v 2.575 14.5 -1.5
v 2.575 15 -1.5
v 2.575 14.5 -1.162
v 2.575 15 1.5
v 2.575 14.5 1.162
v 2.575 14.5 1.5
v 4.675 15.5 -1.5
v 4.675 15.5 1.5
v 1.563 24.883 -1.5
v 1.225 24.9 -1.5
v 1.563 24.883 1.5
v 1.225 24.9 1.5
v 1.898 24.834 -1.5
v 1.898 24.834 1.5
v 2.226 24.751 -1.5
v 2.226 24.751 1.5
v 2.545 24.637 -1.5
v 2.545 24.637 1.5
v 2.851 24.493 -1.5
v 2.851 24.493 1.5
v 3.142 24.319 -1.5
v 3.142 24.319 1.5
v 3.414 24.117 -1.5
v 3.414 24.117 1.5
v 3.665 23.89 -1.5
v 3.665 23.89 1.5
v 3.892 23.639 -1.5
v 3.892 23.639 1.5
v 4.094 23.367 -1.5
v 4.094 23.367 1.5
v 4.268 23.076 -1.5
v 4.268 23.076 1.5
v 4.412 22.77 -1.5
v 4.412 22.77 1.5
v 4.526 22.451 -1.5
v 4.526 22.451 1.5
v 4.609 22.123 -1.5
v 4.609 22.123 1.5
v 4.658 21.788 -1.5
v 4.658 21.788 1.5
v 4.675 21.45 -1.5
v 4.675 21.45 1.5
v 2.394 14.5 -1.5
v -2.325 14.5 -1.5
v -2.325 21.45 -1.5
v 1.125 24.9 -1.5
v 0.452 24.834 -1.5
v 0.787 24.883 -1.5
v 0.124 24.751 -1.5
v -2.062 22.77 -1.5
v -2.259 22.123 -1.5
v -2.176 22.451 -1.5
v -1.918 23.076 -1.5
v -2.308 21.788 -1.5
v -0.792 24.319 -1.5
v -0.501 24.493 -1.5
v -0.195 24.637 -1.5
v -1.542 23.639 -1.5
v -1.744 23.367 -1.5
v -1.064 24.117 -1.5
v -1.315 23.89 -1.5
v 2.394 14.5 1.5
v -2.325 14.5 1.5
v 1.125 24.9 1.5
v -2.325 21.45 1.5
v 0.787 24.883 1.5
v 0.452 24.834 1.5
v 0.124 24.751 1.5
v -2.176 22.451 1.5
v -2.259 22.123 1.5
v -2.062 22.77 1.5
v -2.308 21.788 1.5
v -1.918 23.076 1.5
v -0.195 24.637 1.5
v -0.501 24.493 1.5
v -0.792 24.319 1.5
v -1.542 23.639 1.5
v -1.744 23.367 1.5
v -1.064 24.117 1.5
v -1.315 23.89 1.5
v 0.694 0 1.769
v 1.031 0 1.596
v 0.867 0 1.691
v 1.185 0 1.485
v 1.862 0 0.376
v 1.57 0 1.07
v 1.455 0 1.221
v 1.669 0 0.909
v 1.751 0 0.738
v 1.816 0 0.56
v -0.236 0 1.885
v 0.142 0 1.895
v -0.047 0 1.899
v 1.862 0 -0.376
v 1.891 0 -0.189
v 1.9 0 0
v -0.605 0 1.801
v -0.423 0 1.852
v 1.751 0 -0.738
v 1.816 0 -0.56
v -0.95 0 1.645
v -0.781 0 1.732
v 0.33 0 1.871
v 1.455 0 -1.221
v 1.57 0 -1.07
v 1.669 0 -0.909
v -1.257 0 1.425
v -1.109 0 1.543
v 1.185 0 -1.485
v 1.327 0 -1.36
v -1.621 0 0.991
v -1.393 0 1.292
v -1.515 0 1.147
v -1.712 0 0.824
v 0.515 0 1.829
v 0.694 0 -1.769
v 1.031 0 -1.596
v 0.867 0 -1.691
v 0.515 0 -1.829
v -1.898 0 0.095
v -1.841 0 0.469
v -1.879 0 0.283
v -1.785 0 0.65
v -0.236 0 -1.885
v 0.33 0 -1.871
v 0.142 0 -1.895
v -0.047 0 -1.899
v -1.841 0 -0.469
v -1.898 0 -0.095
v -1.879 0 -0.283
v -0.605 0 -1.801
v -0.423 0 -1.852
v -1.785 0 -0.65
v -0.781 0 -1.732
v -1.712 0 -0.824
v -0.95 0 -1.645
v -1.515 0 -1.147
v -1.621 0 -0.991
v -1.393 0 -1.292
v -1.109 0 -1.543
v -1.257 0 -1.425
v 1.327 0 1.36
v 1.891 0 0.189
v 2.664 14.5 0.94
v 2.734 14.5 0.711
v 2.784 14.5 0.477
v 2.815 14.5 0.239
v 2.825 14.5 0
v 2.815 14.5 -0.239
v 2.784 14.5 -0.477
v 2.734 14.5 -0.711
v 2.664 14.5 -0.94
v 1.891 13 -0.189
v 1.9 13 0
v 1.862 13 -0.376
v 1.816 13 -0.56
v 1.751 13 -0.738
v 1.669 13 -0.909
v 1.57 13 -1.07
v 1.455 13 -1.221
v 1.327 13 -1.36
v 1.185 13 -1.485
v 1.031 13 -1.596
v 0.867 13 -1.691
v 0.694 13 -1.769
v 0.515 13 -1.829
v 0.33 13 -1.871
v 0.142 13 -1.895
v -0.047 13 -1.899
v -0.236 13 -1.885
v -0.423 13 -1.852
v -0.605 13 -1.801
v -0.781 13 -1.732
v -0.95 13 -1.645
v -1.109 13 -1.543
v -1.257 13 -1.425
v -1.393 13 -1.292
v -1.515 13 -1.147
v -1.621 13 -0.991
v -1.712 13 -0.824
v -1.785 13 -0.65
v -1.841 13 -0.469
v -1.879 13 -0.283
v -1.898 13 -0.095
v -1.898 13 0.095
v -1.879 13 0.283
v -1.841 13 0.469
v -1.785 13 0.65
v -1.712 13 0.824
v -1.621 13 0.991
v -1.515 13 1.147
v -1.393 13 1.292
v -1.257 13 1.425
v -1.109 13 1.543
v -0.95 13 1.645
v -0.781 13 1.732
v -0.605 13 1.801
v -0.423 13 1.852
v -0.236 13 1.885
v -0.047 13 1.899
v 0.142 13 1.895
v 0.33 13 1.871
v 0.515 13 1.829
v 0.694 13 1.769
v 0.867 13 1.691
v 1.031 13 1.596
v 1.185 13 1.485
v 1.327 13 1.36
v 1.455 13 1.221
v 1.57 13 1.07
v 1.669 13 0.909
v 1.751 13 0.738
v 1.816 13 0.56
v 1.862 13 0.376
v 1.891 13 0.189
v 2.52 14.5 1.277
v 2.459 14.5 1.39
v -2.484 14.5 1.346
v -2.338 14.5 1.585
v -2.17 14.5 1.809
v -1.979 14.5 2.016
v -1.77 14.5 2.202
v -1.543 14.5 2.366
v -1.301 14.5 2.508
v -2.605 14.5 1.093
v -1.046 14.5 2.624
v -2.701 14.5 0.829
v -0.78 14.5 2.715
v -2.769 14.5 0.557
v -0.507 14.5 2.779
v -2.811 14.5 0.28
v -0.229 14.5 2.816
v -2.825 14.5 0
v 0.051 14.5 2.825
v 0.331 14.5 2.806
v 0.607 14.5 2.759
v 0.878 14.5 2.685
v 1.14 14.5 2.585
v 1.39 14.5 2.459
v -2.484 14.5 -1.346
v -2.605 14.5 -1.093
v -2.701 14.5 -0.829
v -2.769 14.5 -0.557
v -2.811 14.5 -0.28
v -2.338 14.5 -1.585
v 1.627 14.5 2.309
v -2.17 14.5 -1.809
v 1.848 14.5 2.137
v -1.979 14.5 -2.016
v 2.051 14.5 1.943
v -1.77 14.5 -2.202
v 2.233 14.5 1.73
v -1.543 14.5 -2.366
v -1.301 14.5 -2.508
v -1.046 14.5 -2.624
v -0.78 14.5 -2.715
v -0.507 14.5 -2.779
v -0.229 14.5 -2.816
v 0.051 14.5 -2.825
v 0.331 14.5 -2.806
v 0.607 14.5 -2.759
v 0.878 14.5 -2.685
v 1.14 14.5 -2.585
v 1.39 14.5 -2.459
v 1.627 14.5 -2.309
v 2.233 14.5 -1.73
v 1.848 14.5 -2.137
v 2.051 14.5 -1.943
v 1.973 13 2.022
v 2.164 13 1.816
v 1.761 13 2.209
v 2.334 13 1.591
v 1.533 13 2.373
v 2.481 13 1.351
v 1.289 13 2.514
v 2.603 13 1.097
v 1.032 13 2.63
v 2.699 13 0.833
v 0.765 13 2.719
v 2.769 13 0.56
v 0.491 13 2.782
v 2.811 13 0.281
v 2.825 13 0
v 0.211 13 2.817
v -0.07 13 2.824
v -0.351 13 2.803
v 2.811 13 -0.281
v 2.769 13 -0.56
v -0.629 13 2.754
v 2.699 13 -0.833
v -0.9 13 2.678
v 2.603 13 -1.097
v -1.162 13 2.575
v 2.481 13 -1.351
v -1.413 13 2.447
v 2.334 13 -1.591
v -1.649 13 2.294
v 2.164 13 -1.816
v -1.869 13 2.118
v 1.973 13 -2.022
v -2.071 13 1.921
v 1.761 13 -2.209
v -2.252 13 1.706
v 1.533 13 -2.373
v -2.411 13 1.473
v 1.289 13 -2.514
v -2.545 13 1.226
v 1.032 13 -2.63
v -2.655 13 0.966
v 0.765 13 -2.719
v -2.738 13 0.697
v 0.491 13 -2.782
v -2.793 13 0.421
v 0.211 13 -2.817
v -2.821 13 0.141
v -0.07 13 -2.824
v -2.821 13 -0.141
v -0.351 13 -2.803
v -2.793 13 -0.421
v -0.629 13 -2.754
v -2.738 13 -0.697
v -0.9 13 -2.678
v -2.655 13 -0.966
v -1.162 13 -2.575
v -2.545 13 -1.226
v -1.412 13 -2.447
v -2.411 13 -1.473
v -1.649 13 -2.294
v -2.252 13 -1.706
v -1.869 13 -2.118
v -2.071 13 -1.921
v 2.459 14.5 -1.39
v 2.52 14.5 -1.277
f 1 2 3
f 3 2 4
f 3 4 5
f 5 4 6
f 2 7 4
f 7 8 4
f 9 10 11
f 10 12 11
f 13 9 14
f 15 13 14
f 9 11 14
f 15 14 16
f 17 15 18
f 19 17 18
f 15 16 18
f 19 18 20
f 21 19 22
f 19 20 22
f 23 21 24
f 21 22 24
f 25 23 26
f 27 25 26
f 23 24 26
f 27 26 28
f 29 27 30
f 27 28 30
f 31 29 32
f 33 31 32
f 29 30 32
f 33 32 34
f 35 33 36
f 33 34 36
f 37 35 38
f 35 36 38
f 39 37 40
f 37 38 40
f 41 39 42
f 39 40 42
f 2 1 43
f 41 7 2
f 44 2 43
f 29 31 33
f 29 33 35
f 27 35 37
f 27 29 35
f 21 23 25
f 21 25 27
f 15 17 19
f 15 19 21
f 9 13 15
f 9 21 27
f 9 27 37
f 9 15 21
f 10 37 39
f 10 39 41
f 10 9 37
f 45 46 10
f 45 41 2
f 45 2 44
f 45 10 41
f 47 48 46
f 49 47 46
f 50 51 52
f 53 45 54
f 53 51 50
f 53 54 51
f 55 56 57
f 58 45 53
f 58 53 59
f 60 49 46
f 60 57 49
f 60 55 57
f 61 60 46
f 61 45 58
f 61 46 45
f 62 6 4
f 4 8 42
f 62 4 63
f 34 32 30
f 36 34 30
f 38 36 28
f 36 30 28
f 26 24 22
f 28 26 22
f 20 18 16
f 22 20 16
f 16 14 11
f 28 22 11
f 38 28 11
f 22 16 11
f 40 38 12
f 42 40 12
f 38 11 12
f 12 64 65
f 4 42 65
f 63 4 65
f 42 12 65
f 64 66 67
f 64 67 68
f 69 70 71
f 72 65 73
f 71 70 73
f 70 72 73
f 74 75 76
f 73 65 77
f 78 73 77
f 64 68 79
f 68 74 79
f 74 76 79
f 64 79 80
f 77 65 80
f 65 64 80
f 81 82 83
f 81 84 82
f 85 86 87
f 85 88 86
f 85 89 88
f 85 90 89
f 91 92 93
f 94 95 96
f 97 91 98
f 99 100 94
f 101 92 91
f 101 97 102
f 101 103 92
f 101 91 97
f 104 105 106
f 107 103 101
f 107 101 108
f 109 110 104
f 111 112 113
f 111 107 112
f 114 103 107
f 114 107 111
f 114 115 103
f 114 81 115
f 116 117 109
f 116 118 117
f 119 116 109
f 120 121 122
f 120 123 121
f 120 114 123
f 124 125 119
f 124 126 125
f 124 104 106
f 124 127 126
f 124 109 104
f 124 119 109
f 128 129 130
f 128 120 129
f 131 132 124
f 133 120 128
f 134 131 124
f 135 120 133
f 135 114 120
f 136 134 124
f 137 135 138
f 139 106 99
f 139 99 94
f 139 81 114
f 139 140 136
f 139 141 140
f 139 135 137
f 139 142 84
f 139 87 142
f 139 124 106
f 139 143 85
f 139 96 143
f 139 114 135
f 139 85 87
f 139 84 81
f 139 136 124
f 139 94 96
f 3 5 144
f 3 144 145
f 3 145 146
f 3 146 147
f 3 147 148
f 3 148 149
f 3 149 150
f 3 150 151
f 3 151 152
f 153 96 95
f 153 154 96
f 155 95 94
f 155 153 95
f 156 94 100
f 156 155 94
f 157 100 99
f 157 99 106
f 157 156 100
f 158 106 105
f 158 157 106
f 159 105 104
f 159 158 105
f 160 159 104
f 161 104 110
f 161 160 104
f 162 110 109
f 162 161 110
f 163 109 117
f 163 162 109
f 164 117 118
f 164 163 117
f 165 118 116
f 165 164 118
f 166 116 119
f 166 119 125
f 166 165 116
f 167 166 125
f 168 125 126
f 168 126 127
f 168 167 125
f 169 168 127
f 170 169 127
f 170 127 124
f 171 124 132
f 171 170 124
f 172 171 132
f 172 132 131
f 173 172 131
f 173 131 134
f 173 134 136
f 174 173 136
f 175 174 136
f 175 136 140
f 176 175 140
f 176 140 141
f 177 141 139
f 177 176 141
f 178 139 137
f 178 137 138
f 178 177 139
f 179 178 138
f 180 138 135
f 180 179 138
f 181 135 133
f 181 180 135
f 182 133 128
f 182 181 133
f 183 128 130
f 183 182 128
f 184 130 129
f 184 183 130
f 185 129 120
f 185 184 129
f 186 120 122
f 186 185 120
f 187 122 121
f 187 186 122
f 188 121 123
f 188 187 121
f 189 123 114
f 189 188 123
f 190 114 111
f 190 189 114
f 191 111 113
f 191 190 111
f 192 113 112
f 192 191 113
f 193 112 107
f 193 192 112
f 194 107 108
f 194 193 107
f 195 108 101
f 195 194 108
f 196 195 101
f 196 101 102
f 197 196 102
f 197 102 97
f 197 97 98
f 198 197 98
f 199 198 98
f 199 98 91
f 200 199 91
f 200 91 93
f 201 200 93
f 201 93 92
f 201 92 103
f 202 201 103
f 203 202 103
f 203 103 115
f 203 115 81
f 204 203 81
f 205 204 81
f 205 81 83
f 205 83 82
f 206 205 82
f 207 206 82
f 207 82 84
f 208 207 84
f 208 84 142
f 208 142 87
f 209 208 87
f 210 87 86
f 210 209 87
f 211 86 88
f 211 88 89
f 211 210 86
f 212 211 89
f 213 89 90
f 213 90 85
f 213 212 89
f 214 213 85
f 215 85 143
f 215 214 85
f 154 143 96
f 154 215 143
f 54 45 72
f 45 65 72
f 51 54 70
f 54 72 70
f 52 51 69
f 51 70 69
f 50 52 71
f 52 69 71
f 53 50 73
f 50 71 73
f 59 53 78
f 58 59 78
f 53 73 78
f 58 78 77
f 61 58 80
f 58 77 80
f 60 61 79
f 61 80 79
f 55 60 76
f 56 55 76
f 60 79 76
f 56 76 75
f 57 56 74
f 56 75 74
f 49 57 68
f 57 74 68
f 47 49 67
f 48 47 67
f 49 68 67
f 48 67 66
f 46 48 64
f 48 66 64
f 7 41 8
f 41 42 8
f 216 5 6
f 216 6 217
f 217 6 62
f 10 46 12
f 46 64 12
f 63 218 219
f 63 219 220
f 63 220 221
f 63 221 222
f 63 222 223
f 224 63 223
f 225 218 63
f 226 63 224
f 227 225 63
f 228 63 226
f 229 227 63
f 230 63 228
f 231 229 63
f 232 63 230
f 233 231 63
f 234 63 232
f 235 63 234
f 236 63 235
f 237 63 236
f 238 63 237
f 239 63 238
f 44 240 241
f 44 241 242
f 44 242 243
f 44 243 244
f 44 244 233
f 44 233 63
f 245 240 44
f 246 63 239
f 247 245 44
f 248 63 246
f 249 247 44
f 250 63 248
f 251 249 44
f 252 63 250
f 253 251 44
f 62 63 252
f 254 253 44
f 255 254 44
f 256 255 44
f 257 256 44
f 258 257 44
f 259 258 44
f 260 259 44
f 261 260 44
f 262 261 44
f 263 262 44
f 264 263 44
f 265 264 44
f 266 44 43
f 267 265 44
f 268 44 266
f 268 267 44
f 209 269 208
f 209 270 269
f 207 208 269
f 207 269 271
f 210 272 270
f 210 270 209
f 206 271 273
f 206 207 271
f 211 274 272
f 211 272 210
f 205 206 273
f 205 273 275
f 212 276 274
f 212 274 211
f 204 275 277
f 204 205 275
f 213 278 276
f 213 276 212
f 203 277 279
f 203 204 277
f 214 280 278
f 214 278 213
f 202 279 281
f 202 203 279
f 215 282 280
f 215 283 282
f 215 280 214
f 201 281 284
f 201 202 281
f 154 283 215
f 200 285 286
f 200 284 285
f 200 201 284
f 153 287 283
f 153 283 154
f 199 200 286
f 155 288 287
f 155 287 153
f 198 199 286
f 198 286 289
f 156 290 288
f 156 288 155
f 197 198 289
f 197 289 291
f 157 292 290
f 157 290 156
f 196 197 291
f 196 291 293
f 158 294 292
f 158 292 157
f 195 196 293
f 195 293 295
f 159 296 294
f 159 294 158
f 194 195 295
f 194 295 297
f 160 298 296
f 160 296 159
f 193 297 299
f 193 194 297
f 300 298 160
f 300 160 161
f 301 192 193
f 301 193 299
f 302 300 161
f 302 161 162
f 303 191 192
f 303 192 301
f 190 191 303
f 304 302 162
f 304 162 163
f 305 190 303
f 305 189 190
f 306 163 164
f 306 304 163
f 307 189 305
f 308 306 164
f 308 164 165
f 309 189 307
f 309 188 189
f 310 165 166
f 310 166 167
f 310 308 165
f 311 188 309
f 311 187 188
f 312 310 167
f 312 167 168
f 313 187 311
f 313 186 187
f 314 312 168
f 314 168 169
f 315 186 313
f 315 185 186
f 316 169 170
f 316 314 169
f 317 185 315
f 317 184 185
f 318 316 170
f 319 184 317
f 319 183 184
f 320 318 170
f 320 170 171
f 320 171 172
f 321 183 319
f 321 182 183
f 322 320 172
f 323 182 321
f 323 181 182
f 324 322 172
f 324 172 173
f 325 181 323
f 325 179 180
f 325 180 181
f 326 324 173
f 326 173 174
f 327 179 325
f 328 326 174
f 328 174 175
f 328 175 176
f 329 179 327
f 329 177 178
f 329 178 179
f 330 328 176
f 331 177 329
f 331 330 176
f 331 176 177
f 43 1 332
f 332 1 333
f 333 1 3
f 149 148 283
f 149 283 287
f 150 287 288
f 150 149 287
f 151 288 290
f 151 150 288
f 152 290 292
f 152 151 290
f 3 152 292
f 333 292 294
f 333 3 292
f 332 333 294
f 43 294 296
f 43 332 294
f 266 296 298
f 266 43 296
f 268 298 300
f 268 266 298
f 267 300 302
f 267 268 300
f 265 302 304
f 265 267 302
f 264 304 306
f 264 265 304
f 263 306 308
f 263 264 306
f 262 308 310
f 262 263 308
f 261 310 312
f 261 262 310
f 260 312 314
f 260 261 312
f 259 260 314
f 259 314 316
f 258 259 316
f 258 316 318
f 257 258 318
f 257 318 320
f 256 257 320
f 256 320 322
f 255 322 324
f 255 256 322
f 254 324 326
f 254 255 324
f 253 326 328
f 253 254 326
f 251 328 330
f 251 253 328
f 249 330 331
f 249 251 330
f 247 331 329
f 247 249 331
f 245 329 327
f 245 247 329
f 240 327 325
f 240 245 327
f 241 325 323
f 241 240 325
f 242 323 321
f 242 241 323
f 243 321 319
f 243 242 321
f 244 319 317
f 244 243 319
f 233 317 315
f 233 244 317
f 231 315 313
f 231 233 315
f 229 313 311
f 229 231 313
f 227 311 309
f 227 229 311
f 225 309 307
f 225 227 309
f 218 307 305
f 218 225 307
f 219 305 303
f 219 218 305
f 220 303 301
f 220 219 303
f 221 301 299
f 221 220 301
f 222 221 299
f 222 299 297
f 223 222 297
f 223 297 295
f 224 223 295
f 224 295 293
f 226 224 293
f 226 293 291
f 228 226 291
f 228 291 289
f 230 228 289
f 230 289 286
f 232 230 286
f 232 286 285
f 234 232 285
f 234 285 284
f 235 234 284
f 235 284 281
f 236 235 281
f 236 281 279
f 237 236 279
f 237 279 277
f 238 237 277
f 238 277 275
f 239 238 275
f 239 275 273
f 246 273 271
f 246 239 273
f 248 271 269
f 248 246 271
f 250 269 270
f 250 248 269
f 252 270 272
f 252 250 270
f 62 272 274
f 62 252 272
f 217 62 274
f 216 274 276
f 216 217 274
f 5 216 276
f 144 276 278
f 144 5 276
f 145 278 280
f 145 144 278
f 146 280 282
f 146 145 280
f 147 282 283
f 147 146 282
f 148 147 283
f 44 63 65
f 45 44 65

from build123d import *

# Parameters (mm, degrees)
BOSS_EXTRUDE1_DEPTH = 1.5


with BuildPart() as part:
    # Sketch1 → Revolve1 (revolve)
    with BuildSketch(Plane.XY):
        Polygon((0, 0), (1.9, 0), (1.9, 13), (2.825, 13), (2.825, 14.5), (0, 14.5), align=None)
    revolve(axis=Axis((0, 0, 0), (0, 1, 0)))

    # Sketch2 → Boss-Extrude1 (add, symmetric)
    with BuildSketch(Plane.XY):
        with BuildLine():
            Line((-2.325, 14.5), (-2.325, 21.45))
            ThreePointArc((-2.325, 21.45), (-1.314518395, 23.889518395), (1.125, 24.9))
            Line((1.125, 24.9), (1.225, 24.9))
            ThreePointArc((1.225, 24.9), (3.664518395, 23.889518395), (4.675, 21.45))
            Line((4.675, 21.45), (4.675, 15.5))
            Line((4.675, 15.5), (2.575, 15))
            Line((2.575, 15), (2.575, 14.5))
            Line((2.575, 14.5), (-2.325, 14.5))
        make_face()
    extrude(amount=BOSS_EXTRUDE1_DEPTH, both=True)


solid = part.part
